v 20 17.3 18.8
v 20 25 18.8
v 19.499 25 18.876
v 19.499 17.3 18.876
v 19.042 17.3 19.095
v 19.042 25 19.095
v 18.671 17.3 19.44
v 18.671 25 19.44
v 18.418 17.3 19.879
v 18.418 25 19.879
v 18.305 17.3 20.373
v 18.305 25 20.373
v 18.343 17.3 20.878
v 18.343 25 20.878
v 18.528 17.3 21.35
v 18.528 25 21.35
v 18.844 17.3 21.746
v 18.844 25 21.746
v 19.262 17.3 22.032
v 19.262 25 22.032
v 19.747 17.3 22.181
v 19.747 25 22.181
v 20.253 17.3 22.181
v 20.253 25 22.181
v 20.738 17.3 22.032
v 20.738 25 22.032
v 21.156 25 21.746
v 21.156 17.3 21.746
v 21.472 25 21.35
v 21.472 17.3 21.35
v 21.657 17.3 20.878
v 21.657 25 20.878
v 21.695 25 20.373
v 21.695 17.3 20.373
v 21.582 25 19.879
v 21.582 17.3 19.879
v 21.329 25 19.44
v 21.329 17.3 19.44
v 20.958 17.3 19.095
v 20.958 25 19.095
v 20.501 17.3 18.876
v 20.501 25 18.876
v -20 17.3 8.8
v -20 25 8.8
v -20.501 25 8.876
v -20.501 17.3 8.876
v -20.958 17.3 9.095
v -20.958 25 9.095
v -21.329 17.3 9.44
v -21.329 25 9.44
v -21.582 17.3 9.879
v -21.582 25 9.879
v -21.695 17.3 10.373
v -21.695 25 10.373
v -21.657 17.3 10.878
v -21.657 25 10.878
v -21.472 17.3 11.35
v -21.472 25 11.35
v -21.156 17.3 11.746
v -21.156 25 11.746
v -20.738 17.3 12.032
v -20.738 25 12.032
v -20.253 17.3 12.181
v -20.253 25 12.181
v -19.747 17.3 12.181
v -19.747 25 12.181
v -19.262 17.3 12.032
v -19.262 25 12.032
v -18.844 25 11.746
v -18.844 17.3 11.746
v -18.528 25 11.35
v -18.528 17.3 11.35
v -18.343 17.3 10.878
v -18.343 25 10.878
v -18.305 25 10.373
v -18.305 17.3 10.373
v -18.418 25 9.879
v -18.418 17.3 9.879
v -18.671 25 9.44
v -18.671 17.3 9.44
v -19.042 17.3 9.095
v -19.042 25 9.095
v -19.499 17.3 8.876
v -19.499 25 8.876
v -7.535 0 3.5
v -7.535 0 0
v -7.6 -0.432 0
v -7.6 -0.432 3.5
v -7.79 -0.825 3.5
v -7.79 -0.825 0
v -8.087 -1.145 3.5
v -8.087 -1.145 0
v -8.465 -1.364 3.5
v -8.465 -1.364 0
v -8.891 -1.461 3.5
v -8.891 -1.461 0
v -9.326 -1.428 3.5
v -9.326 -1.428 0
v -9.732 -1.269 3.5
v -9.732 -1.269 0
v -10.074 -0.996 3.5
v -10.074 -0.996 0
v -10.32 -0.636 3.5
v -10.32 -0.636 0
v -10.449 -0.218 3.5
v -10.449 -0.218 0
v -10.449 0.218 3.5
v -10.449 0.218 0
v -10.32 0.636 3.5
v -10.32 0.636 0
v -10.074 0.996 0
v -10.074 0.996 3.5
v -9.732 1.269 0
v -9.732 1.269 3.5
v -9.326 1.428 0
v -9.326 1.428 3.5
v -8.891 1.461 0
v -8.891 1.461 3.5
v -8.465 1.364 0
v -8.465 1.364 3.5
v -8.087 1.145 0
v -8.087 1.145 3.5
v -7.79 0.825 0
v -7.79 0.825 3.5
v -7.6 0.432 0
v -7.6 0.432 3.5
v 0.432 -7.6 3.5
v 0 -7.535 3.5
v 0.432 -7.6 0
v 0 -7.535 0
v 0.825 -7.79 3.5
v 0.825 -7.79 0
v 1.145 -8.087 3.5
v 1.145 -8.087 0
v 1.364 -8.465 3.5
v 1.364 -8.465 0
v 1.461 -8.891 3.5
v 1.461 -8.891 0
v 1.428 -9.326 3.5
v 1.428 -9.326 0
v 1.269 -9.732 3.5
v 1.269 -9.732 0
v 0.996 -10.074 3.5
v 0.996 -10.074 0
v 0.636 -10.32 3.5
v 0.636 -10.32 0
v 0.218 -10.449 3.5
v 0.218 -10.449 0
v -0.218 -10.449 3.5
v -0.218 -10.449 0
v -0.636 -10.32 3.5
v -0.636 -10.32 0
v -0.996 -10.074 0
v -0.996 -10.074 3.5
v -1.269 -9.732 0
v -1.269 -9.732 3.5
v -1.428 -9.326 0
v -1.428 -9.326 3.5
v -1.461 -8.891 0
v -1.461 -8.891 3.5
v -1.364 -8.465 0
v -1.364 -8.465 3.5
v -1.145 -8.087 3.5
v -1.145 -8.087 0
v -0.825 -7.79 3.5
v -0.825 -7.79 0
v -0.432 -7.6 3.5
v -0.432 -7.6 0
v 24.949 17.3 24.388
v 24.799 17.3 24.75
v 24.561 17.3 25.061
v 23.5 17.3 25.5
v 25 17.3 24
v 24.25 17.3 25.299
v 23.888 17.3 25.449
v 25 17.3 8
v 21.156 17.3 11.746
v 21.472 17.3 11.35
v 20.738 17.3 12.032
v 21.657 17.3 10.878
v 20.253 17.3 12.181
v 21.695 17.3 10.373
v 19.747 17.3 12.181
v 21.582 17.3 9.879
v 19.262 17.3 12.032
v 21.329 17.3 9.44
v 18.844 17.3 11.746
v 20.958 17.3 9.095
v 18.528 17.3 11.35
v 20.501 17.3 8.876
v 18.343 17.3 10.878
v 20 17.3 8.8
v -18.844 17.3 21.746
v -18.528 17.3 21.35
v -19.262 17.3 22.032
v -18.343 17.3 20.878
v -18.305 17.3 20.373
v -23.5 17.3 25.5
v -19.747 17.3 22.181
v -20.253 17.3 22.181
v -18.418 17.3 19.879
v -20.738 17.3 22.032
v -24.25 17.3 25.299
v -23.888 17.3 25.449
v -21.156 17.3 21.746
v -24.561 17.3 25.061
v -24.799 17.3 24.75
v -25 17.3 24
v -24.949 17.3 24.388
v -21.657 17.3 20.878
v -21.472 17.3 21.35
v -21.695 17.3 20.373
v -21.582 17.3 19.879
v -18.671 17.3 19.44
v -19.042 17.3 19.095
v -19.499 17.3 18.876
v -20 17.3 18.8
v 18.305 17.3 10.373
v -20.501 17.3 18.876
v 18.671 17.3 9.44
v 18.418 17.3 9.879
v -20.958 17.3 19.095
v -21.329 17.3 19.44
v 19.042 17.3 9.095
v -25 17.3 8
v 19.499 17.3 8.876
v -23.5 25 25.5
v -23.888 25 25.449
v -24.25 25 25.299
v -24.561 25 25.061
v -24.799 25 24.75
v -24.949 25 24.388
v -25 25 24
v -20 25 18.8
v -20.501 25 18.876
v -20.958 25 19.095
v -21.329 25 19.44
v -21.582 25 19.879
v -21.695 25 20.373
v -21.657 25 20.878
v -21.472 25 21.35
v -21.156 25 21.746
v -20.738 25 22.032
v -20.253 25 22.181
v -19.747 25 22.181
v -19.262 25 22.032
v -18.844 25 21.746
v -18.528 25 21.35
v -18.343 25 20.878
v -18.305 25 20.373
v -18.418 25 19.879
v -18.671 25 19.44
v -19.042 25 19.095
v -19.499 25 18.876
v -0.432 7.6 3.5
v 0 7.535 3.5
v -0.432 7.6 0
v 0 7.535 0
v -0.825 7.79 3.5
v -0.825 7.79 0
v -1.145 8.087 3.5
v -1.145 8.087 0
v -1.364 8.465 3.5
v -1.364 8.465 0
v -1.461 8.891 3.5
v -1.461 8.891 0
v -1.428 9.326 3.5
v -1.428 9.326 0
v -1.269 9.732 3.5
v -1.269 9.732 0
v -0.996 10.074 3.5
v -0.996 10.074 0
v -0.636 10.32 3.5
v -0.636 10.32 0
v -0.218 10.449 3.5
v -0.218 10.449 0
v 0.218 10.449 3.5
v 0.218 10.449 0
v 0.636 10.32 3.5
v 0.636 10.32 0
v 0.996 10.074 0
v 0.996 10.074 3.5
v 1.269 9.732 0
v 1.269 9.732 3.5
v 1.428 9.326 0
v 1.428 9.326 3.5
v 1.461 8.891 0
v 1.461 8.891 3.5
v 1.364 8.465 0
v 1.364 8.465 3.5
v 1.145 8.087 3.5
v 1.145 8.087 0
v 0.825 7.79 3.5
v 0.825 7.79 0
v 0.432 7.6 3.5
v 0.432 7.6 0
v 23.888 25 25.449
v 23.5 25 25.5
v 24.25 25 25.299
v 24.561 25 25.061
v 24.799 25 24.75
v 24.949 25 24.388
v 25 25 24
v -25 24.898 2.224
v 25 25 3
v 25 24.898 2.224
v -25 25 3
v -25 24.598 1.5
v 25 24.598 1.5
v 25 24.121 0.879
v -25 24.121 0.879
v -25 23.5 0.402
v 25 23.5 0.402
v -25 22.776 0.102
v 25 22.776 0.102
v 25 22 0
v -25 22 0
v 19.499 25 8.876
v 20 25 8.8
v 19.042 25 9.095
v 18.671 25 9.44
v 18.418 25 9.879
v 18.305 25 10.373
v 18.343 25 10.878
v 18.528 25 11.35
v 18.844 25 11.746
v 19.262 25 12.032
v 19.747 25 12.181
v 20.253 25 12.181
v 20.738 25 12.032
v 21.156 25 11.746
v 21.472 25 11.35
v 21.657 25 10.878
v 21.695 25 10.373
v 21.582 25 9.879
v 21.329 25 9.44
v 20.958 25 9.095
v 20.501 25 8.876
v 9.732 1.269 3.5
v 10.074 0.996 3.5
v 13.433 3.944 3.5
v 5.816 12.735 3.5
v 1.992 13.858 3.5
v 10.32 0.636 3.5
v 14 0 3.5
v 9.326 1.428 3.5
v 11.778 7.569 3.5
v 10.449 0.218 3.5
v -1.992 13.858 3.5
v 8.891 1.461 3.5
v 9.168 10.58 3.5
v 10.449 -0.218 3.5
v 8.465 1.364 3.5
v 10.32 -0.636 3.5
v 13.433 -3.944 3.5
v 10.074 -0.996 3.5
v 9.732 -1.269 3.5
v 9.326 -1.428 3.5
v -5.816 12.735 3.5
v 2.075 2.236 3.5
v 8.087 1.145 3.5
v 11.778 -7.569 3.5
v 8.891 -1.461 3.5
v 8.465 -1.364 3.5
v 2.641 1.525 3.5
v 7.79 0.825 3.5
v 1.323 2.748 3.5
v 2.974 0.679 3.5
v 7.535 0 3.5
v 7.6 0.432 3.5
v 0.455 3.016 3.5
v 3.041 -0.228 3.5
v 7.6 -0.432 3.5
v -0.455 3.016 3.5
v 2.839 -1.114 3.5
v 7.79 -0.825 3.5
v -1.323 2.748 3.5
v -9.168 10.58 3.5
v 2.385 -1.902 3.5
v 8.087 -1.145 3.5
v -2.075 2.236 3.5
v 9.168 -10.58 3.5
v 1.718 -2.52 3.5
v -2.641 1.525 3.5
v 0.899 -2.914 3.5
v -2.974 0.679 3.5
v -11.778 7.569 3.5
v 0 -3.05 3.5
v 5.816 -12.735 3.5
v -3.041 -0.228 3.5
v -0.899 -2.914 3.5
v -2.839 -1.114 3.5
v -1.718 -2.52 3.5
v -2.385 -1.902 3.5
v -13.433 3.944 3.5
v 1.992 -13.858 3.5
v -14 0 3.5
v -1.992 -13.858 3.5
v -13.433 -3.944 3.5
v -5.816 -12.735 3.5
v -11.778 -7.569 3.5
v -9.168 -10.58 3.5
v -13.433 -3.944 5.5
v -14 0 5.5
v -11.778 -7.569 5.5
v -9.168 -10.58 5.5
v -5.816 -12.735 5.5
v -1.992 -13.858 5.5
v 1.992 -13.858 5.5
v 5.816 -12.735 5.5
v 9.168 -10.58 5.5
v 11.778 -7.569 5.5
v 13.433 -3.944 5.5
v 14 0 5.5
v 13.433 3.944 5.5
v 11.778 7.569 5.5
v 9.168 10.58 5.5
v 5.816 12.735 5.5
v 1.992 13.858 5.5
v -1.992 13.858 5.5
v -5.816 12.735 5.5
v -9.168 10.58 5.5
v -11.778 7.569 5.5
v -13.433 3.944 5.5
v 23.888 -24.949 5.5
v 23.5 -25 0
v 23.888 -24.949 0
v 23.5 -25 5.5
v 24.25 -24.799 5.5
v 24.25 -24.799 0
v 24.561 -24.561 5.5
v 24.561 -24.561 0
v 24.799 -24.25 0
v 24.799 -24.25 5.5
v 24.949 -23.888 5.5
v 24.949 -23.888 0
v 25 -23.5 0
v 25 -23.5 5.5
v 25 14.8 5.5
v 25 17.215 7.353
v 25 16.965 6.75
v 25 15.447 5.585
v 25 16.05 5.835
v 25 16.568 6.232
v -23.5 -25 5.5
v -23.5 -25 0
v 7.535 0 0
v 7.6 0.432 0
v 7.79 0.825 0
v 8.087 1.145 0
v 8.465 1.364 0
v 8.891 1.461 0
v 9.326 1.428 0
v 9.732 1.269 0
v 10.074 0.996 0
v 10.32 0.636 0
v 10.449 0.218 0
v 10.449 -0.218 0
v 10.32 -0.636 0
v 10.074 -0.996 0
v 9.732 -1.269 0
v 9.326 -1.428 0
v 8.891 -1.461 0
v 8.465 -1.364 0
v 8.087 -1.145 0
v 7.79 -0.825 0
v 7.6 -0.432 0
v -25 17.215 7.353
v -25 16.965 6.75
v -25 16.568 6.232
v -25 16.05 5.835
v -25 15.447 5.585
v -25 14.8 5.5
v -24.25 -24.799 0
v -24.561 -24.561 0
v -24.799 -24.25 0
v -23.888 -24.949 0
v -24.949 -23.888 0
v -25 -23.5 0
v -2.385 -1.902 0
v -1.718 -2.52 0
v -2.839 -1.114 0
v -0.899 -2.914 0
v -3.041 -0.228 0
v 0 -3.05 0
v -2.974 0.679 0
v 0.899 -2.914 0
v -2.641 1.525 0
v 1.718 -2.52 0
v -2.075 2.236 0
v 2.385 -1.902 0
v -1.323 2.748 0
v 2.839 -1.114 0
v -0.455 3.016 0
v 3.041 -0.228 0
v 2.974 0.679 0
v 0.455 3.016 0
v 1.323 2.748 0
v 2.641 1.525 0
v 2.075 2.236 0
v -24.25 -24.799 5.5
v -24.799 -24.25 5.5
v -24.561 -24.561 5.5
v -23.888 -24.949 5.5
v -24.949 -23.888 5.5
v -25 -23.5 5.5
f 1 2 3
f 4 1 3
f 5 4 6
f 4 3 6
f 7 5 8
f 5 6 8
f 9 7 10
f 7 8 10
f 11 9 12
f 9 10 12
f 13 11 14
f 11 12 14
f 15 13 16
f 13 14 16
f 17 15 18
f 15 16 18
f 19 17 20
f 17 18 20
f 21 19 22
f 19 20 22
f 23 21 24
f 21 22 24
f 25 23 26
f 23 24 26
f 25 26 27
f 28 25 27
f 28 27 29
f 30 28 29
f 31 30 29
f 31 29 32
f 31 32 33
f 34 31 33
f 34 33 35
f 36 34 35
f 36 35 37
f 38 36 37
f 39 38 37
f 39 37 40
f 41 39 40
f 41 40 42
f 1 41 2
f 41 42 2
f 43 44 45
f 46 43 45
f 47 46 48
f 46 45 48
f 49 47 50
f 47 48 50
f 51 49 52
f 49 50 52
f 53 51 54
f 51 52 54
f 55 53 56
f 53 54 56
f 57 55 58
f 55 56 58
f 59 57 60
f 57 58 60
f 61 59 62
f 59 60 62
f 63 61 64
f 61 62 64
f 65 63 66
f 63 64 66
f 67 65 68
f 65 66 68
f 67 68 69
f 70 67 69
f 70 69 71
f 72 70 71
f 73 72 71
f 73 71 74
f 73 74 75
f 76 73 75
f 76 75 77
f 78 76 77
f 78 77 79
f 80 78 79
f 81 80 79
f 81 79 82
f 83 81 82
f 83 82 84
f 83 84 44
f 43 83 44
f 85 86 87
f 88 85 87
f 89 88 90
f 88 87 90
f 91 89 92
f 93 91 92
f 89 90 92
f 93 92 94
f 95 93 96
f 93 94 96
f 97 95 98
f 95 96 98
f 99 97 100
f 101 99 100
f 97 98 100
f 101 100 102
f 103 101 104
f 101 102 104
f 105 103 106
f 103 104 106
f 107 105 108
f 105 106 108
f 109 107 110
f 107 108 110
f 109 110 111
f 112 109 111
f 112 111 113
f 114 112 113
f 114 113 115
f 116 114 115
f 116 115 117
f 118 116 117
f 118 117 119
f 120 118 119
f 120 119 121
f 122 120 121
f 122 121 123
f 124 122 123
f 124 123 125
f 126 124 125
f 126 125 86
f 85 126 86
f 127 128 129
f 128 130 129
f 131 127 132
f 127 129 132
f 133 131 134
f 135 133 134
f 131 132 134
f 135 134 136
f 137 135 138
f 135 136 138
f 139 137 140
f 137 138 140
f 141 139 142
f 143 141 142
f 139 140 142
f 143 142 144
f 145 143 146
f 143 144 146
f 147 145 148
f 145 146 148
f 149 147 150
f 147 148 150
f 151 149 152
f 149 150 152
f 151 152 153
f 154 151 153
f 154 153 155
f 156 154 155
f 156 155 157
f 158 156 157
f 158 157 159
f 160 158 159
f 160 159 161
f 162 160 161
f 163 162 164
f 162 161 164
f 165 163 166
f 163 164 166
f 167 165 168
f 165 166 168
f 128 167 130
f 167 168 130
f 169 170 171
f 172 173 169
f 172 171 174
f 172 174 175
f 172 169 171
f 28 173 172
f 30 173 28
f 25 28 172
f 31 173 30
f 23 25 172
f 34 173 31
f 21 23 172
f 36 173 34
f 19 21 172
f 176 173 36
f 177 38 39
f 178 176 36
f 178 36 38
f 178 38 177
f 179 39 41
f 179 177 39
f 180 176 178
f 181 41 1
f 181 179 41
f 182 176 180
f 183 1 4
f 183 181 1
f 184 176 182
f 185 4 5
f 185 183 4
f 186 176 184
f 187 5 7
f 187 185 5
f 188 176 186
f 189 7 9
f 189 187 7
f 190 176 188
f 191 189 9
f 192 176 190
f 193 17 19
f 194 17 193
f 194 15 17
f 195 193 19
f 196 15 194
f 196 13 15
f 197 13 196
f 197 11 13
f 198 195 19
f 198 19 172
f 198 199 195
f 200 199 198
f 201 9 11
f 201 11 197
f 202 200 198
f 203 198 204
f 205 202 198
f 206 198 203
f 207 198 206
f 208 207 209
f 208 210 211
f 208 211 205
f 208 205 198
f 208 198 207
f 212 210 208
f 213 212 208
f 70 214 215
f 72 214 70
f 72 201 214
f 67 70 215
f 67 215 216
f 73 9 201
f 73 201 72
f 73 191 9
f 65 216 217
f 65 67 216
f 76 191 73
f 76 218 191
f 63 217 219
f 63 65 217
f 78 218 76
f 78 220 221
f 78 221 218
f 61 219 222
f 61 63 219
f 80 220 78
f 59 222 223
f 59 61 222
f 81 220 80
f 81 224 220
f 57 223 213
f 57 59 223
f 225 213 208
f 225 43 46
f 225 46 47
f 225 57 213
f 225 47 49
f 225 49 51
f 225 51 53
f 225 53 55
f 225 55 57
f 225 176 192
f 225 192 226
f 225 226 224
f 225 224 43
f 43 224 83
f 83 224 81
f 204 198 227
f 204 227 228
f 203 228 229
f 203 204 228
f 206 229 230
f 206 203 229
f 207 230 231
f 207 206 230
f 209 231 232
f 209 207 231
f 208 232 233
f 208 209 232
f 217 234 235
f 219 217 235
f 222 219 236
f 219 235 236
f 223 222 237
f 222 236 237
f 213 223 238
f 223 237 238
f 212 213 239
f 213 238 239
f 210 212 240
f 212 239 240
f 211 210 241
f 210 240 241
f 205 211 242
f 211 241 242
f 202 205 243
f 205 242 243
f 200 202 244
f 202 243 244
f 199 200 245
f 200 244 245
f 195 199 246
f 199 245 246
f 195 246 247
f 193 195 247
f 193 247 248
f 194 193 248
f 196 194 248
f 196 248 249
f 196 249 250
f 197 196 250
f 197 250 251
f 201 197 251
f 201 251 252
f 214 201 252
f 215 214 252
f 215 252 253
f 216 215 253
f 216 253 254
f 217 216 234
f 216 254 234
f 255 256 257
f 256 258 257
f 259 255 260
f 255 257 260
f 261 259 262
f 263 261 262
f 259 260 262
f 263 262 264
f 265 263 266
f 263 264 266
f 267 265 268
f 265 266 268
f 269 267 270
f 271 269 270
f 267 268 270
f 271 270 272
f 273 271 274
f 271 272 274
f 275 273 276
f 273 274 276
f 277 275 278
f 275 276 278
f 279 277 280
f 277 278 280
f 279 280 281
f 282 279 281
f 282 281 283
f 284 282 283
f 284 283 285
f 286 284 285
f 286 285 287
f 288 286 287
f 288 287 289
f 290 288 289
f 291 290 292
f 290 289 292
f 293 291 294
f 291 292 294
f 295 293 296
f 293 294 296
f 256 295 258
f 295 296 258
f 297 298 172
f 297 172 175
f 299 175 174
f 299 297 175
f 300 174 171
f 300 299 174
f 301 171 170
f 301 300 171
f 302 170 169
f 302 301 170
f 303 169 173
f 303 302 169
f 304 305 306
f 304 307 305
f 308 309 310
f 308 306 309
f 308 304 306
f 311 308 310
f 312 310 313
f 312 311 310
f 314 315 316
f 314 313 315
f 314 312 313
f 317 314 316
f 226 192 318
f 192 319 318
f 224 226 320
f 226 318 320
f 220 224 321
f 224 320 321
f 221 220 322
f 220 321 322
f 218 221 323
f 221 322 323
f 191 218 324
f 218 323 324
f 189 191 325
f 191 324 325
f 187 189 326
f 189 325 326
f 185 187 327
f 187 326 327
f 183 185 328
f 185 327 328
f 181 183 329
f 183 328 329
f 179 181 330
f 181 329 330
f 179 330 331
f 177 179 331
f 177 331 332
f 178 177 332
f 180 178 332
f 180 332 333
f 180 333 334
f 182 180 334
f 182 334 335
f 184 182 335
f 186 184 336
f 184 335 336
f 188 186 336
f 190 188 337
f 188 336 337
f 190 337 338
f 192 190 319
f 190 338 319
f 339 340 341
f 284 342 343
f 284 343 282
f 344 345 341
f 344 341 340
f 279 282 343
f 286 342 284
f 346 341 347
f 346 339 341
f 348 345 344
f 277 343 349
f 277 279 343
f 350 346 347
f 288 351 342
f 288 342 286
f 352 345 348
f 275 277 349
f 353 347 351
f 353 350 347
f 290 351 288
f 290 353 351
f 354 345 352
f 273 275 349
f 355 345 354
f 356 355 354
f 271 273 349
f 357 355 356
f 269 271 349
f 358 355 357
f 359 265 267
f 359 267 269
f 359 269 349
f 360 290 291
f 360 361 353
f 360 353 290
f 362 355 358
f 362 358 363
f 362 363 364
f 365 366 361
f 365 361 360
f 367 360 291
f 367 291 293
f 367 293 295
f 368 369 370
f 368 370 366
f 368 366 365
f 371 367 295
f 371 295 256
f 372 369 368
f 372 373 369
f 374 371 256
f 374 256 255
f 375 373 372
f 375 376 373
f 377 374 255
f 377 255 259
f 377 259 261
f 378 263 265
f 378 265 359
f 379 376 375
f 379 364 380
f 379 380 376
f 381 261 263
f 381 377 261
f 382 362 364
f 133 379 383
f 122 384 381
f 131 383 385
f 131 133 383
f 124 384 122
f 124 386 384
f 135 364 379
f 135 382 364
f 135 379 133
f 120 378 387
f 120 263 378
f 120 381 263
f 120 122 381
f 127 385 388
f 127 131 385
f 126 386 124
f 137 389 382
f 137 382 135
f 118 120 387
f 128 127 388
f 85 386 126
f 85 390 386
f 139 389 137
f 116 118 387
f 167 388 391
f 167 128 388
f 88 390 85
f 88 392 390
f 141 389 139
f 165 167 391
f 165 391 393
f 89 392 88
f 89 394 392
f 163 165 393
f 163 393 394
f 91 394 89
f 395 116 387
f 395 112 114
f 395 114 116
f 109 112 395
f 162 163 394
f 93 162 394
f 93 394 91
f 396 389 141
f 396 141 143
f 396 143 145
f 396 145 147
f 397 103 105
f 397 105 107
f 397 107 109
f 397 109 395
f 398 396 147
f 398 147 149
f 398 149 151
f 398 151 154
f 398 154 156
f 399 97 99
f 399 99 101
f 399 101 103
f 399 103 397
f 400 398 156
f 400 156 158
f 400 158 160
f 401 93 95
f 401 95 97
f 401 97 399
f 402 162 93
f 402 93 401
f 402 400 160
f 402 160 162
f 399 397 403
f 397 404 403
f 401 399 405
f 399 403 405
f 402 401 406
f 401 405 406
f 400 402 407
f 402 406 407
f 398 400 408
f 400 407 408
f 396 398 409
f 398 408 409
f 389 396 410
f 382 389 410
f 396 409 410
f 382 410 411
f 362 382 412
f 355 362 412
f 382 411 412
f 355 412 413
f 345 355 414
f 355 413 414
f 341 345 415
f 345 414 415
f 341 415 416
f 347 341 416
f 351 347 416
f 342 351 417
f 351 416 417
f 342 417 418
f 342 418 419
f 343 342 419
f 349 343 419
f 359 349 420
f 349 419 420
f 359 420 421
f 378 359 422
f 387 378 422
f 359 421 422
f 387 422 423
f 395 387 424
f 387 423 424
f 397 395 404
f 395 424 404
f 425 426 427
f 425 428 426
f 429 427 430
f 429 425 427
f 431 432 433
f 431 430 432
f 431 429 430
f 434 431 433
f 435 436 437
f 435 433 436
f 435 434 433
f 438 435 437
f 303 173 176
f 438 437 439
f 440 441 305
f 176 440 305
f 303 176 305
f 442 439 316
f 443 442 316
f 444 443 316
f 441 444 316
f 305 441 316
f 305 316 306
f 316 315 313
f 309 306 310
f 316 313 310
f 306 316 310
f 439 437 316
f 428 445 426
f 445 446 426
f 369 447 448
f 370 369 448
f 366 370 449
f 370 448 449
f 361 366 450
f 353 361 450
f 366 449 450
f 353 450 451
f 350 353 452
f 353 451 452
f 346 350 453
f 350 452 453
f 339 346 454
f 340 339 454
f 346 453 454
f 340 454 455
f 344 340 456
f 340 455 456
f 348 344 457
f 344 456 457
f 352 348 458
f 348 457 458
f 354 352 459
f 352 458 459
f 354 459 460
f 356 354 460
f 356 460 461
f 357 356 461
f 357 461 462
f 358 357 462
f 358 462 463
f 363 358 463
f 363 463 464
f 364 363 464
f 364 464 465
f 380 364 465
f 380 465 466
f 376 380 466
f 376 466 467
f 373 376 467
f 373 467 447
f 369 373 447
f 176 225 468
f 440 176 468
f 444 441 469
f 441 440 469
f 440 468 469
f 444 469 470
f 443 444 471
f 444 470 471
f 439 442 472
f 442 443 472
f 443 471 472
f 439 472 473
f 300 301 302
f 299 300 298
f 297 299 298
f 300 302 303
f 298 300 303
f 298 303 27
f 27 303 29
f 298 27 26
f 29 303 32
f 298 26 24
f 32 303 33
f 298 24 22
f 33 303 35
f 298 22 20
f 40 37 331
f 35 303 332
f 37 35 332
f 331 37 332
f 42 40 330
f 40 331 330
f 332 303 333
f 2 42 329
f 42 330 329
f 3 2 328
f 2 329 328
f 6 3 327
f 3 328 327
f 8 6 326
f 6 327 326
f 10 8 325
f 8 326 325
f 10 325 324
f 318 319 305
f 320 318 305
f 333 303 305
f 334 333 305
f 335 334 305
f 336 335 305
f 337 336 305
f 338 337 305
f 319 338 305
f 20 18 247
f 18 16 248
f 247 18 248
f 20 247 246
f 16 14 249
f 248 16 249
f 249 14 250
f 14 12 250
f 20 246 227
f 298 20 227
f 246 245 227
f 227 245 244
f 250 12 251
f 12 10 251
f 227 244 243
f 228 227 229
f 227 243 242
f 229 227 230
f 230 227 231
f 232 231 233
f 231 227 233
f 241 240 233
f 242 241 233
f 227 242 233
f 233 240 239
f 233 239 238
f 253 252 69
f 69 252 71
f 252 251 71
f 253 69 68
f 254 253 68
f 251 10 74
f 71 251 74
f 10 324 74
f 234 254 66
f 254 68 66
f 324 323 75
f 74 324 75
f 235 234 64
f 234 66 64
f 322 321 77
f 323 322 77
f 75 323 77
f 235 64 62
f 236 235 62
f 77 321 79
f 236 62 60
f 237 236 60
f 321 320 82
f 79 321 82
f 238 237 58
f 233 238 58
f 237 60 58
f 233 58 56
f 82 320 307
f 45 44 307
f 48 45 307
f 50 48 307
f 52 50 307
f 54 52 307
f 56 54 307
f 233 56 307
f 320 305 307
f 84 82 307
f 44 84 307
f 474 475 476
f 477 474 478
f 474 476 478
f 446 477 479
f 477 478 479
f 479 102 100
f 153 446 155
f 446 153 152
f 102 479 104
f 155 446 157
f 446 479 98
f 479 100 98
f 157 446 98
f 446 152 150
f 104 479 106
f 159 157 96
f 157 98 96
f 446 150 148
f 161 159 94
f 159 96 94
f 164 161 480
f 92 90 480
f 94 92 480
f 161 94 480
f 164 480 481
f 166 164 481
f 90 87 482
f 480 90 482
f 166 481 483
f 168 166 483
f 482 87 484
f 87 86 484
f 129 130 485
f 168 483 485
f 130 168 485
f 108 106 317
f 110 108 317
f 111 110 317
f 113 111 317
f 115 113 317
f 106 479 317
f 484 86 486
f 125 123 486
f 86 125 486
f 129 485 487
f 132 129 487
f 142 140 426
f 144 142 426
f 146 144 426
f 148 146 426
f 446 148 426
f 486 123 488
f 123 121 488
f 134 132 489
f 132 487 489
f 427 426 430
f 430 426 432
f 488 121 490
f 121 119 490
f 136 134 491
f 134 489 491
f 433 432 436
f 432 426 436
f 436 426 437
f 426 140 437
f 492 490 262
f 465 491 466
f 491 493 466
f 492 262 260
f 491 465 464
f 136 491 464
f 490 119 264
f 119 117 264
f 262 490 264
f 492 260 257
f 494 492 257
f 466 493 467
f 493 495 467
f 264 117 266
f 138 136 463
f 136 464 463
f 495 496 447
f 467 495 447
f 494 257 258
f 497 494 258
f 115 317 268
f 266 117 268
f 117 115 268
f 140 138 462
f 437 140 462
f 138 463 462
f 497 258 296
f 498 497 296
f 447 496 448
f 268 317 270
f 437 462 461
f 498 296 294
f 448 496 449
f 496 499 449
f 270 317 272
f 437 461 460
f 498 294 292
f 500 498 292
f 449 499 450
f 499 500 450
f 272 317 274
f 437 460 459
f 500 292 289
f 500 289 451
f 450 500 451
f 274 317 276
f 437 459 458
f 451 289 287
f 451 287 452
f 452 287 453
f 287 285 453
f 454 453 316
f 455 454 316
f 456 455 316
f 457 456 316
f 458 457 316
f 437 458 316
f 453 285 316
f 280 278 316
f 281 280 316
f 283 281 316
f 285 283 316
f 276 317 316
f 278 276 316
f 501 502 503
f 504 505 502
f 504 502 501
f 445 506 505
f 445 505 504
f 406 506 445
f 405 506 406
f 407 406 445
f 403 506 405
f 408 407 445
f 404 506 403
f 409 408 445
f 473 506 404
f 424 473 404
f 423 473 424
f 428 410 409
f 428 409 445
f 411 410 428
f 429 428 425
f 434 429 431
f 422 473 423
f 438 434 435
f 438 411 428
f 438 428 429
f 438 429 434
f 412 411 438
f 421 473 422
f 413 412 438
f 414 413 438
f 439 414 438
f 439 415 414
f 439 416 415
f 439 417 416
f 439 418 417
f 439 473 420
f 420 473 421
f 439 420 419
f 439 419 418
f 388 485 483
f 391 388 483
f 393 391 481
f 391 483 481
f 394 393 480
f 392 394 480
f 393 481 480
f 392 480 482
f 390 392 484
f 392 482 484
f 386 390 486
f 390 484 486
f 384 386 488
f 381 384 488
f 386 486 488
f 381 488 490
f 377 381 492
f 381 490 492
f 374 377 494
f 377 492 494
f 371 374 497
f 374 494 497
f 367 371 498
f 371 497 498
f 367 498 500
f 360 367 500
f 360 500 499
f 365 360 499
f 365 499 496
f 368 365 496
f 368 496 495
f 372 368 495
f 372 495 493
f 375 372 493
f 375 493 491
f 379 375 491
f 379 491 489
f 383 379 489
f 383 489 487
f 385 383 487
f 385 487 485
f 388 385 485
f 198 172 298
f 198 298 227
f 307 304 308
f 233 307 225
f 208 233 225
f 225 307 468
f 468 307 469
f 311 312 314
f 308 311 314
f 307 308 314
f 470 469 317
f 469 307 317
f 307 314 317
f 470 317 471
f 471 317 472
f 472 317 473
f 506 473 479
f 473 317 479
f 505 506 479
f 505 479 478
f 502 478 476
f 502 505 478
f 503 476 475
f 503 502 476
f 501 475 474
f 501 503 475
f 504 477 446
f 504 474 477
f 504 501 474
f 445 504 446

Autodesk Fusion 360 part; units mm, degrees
sketch "Sketch1" plane through (0, 0, 0) normal (0, 0, 1) x (1, 0, 0)
  line L0 (25, 25) -> (-25, 25)
  line L1 (-25, 25) -> (-25, -25)
  line L2 (-25, -25) -> (25, -25)
  line L3 (25, -25) -> (25, 25)
  line L4 (25, 25) -> (-25, -25) construction
  line L5 (-25, 25) -> (25, -25) construction
  dimension "d1" = 50
  dimension "d2" = 50
extrude "Extrude1" add sketch "Sketch1" along normal blind 5.5
sketch "Sketch2" plane through (0, 0, 5.5) normal (0, 0, 1) x (-1, 0, 0)
  line L0 (-25, 25) -> (-25, -25)
  line L1 (-25, -25) -> (25, -25)
  line L2 (25, -25) -> (25, 25)
  line L3 (25, 25) -> (-25, 25)
  line L4 (25, -25) -> (-25, -25)
  line L5 (-25, -25) -> (-25, -17.3)
  line L6 (-25, -17.3) -> (25, -17.3)
  line L7 (25, -17.3) -> (25, -25)
  dimension "d11" = 7.7
  dimension "d12" = 50
extrude "Extrude2" add sketch "Sketch2" along normal blind 20 contours L0 L1 L2 L4 L5 L6 L7
sketch "Sketch3" plane through (0, 0, 5.5) normal (0, 0, 1) x (-1, 0, 0)
  line L0 (-25, -17.3) -> (25, -17.3)
  line L1 (25, -17.3) -> (25, 25)
  line L2 (25, 25) -> (-25, 25)
  line L3 (-25, 25) -> (-25, -17.3)
  circle A0 centre (0, 0) radius 14
  dimension "d15" = 28
sketch "Sketch4" plane through (0, 0, 5.5) normal (0, 0, 1) x (-1, 0, 0)
fillet "Fillet1" radius 2.5 1 edges at (0, 17.3, 5.5)
fillet "Fillet2" radius 3 1 edges at (0, 25, 0)
fillet "Fillet3" radius 1.5 4 edges at (25, -25, 2.75) (-25, -25, 2.75) (25, 21.15, 25.5) (-25, 21.15, 25.5)
extrude "Extrude3" cut sketch "Sketch3" against normal blind 2 contours A0
sketch "Sketch5" plane through (0, 0, 5.5) normal (0, 0, 1) x (-1, 0, 0)
  circle A0 centre (0, 0) radius 14
  arc A1 (25, 23.5) -> (23.5, 25) centre (23.5, 23.5) ccw
  line L0 (23.5, 25) -> (-23.5, 25)
  arc A2 (-23.5, 25) -> (-25, 23.5) centre (-23.5, 23.5) ccw
  line L1 (-25, 23.5) -> (-25, -14.8)
  line L2 (-25, -14.8) -> (25, -14.8)
  line L3 (25, -14.8) -> (25, 23.5)
  circle A3 centre (0, 0) radius 9 construction
  point P0 (0, -9)
  dimension "d24" = 18
hole "Hole1" at (0, 0, 5.5) direction (0, 0, -1) diameter 6.1 depth 10 tip angle 118
hole "Hole2" at (0, 9, 5.5) direction (0, 0, -1) diameter 2.93 depth 10 tip angle 118
pattern_circular "C-Pattern1" count 4 over 360 about axis through (0, 0, 1.75) along (0, 0, 1) of "Hole2"
hole "Hole3" at (-20, 17.3, 20.5) direction (0, 1, 0) diameter 3.4 depth 10 tip angle 118
hole "Hole4" at (-20, 17.3, 10.5) direction (0, 1, 0) diameter 3.4 depth 10 tip angle 118
hole "Hole5" at (20, 17.3, 20.5) direction (0, 1, 0) diameter 3.4 depth 10 tip angle 118
hole "Hole6" at (20, 17.3, 10.5) direction (0, 1, 0) diameter 3.4 depth 10 tip angle 118
equation "Base_Feature_1 = 50 mm"
equation "Width_Feature_1 = 50 mm"
equation "thickness_Feature_1 = 5.5 mm"
equation "Base_Feature_2 = 50 mm"
equation "Height_Feature_2 = 20 mm"
equation "Thickness_Feature_2 = 7.7 mm"
equation "d11 = Thickness_Feature_2"
equation "d12 = Base_Feature_2"
equation "d13 = Height_Feature_2"
equation "Feature_2_Edge = 5 mm"
equation "Feature_2_Top = 5.0 mm"
equation "Feat_2_Left_Holes_Xpos = Feature_2_Edge"
equation "Feat_2_Right_Holes_xpos = Base_Feature_2 - Feature_2_Edge"
equation "motor_hole = 6.1 mm"
equation "Feature_1_Motor_Hole = 6.1 mm"
equation "Feature_1_Motor_Mount_Hole_Size = 3 mm"
